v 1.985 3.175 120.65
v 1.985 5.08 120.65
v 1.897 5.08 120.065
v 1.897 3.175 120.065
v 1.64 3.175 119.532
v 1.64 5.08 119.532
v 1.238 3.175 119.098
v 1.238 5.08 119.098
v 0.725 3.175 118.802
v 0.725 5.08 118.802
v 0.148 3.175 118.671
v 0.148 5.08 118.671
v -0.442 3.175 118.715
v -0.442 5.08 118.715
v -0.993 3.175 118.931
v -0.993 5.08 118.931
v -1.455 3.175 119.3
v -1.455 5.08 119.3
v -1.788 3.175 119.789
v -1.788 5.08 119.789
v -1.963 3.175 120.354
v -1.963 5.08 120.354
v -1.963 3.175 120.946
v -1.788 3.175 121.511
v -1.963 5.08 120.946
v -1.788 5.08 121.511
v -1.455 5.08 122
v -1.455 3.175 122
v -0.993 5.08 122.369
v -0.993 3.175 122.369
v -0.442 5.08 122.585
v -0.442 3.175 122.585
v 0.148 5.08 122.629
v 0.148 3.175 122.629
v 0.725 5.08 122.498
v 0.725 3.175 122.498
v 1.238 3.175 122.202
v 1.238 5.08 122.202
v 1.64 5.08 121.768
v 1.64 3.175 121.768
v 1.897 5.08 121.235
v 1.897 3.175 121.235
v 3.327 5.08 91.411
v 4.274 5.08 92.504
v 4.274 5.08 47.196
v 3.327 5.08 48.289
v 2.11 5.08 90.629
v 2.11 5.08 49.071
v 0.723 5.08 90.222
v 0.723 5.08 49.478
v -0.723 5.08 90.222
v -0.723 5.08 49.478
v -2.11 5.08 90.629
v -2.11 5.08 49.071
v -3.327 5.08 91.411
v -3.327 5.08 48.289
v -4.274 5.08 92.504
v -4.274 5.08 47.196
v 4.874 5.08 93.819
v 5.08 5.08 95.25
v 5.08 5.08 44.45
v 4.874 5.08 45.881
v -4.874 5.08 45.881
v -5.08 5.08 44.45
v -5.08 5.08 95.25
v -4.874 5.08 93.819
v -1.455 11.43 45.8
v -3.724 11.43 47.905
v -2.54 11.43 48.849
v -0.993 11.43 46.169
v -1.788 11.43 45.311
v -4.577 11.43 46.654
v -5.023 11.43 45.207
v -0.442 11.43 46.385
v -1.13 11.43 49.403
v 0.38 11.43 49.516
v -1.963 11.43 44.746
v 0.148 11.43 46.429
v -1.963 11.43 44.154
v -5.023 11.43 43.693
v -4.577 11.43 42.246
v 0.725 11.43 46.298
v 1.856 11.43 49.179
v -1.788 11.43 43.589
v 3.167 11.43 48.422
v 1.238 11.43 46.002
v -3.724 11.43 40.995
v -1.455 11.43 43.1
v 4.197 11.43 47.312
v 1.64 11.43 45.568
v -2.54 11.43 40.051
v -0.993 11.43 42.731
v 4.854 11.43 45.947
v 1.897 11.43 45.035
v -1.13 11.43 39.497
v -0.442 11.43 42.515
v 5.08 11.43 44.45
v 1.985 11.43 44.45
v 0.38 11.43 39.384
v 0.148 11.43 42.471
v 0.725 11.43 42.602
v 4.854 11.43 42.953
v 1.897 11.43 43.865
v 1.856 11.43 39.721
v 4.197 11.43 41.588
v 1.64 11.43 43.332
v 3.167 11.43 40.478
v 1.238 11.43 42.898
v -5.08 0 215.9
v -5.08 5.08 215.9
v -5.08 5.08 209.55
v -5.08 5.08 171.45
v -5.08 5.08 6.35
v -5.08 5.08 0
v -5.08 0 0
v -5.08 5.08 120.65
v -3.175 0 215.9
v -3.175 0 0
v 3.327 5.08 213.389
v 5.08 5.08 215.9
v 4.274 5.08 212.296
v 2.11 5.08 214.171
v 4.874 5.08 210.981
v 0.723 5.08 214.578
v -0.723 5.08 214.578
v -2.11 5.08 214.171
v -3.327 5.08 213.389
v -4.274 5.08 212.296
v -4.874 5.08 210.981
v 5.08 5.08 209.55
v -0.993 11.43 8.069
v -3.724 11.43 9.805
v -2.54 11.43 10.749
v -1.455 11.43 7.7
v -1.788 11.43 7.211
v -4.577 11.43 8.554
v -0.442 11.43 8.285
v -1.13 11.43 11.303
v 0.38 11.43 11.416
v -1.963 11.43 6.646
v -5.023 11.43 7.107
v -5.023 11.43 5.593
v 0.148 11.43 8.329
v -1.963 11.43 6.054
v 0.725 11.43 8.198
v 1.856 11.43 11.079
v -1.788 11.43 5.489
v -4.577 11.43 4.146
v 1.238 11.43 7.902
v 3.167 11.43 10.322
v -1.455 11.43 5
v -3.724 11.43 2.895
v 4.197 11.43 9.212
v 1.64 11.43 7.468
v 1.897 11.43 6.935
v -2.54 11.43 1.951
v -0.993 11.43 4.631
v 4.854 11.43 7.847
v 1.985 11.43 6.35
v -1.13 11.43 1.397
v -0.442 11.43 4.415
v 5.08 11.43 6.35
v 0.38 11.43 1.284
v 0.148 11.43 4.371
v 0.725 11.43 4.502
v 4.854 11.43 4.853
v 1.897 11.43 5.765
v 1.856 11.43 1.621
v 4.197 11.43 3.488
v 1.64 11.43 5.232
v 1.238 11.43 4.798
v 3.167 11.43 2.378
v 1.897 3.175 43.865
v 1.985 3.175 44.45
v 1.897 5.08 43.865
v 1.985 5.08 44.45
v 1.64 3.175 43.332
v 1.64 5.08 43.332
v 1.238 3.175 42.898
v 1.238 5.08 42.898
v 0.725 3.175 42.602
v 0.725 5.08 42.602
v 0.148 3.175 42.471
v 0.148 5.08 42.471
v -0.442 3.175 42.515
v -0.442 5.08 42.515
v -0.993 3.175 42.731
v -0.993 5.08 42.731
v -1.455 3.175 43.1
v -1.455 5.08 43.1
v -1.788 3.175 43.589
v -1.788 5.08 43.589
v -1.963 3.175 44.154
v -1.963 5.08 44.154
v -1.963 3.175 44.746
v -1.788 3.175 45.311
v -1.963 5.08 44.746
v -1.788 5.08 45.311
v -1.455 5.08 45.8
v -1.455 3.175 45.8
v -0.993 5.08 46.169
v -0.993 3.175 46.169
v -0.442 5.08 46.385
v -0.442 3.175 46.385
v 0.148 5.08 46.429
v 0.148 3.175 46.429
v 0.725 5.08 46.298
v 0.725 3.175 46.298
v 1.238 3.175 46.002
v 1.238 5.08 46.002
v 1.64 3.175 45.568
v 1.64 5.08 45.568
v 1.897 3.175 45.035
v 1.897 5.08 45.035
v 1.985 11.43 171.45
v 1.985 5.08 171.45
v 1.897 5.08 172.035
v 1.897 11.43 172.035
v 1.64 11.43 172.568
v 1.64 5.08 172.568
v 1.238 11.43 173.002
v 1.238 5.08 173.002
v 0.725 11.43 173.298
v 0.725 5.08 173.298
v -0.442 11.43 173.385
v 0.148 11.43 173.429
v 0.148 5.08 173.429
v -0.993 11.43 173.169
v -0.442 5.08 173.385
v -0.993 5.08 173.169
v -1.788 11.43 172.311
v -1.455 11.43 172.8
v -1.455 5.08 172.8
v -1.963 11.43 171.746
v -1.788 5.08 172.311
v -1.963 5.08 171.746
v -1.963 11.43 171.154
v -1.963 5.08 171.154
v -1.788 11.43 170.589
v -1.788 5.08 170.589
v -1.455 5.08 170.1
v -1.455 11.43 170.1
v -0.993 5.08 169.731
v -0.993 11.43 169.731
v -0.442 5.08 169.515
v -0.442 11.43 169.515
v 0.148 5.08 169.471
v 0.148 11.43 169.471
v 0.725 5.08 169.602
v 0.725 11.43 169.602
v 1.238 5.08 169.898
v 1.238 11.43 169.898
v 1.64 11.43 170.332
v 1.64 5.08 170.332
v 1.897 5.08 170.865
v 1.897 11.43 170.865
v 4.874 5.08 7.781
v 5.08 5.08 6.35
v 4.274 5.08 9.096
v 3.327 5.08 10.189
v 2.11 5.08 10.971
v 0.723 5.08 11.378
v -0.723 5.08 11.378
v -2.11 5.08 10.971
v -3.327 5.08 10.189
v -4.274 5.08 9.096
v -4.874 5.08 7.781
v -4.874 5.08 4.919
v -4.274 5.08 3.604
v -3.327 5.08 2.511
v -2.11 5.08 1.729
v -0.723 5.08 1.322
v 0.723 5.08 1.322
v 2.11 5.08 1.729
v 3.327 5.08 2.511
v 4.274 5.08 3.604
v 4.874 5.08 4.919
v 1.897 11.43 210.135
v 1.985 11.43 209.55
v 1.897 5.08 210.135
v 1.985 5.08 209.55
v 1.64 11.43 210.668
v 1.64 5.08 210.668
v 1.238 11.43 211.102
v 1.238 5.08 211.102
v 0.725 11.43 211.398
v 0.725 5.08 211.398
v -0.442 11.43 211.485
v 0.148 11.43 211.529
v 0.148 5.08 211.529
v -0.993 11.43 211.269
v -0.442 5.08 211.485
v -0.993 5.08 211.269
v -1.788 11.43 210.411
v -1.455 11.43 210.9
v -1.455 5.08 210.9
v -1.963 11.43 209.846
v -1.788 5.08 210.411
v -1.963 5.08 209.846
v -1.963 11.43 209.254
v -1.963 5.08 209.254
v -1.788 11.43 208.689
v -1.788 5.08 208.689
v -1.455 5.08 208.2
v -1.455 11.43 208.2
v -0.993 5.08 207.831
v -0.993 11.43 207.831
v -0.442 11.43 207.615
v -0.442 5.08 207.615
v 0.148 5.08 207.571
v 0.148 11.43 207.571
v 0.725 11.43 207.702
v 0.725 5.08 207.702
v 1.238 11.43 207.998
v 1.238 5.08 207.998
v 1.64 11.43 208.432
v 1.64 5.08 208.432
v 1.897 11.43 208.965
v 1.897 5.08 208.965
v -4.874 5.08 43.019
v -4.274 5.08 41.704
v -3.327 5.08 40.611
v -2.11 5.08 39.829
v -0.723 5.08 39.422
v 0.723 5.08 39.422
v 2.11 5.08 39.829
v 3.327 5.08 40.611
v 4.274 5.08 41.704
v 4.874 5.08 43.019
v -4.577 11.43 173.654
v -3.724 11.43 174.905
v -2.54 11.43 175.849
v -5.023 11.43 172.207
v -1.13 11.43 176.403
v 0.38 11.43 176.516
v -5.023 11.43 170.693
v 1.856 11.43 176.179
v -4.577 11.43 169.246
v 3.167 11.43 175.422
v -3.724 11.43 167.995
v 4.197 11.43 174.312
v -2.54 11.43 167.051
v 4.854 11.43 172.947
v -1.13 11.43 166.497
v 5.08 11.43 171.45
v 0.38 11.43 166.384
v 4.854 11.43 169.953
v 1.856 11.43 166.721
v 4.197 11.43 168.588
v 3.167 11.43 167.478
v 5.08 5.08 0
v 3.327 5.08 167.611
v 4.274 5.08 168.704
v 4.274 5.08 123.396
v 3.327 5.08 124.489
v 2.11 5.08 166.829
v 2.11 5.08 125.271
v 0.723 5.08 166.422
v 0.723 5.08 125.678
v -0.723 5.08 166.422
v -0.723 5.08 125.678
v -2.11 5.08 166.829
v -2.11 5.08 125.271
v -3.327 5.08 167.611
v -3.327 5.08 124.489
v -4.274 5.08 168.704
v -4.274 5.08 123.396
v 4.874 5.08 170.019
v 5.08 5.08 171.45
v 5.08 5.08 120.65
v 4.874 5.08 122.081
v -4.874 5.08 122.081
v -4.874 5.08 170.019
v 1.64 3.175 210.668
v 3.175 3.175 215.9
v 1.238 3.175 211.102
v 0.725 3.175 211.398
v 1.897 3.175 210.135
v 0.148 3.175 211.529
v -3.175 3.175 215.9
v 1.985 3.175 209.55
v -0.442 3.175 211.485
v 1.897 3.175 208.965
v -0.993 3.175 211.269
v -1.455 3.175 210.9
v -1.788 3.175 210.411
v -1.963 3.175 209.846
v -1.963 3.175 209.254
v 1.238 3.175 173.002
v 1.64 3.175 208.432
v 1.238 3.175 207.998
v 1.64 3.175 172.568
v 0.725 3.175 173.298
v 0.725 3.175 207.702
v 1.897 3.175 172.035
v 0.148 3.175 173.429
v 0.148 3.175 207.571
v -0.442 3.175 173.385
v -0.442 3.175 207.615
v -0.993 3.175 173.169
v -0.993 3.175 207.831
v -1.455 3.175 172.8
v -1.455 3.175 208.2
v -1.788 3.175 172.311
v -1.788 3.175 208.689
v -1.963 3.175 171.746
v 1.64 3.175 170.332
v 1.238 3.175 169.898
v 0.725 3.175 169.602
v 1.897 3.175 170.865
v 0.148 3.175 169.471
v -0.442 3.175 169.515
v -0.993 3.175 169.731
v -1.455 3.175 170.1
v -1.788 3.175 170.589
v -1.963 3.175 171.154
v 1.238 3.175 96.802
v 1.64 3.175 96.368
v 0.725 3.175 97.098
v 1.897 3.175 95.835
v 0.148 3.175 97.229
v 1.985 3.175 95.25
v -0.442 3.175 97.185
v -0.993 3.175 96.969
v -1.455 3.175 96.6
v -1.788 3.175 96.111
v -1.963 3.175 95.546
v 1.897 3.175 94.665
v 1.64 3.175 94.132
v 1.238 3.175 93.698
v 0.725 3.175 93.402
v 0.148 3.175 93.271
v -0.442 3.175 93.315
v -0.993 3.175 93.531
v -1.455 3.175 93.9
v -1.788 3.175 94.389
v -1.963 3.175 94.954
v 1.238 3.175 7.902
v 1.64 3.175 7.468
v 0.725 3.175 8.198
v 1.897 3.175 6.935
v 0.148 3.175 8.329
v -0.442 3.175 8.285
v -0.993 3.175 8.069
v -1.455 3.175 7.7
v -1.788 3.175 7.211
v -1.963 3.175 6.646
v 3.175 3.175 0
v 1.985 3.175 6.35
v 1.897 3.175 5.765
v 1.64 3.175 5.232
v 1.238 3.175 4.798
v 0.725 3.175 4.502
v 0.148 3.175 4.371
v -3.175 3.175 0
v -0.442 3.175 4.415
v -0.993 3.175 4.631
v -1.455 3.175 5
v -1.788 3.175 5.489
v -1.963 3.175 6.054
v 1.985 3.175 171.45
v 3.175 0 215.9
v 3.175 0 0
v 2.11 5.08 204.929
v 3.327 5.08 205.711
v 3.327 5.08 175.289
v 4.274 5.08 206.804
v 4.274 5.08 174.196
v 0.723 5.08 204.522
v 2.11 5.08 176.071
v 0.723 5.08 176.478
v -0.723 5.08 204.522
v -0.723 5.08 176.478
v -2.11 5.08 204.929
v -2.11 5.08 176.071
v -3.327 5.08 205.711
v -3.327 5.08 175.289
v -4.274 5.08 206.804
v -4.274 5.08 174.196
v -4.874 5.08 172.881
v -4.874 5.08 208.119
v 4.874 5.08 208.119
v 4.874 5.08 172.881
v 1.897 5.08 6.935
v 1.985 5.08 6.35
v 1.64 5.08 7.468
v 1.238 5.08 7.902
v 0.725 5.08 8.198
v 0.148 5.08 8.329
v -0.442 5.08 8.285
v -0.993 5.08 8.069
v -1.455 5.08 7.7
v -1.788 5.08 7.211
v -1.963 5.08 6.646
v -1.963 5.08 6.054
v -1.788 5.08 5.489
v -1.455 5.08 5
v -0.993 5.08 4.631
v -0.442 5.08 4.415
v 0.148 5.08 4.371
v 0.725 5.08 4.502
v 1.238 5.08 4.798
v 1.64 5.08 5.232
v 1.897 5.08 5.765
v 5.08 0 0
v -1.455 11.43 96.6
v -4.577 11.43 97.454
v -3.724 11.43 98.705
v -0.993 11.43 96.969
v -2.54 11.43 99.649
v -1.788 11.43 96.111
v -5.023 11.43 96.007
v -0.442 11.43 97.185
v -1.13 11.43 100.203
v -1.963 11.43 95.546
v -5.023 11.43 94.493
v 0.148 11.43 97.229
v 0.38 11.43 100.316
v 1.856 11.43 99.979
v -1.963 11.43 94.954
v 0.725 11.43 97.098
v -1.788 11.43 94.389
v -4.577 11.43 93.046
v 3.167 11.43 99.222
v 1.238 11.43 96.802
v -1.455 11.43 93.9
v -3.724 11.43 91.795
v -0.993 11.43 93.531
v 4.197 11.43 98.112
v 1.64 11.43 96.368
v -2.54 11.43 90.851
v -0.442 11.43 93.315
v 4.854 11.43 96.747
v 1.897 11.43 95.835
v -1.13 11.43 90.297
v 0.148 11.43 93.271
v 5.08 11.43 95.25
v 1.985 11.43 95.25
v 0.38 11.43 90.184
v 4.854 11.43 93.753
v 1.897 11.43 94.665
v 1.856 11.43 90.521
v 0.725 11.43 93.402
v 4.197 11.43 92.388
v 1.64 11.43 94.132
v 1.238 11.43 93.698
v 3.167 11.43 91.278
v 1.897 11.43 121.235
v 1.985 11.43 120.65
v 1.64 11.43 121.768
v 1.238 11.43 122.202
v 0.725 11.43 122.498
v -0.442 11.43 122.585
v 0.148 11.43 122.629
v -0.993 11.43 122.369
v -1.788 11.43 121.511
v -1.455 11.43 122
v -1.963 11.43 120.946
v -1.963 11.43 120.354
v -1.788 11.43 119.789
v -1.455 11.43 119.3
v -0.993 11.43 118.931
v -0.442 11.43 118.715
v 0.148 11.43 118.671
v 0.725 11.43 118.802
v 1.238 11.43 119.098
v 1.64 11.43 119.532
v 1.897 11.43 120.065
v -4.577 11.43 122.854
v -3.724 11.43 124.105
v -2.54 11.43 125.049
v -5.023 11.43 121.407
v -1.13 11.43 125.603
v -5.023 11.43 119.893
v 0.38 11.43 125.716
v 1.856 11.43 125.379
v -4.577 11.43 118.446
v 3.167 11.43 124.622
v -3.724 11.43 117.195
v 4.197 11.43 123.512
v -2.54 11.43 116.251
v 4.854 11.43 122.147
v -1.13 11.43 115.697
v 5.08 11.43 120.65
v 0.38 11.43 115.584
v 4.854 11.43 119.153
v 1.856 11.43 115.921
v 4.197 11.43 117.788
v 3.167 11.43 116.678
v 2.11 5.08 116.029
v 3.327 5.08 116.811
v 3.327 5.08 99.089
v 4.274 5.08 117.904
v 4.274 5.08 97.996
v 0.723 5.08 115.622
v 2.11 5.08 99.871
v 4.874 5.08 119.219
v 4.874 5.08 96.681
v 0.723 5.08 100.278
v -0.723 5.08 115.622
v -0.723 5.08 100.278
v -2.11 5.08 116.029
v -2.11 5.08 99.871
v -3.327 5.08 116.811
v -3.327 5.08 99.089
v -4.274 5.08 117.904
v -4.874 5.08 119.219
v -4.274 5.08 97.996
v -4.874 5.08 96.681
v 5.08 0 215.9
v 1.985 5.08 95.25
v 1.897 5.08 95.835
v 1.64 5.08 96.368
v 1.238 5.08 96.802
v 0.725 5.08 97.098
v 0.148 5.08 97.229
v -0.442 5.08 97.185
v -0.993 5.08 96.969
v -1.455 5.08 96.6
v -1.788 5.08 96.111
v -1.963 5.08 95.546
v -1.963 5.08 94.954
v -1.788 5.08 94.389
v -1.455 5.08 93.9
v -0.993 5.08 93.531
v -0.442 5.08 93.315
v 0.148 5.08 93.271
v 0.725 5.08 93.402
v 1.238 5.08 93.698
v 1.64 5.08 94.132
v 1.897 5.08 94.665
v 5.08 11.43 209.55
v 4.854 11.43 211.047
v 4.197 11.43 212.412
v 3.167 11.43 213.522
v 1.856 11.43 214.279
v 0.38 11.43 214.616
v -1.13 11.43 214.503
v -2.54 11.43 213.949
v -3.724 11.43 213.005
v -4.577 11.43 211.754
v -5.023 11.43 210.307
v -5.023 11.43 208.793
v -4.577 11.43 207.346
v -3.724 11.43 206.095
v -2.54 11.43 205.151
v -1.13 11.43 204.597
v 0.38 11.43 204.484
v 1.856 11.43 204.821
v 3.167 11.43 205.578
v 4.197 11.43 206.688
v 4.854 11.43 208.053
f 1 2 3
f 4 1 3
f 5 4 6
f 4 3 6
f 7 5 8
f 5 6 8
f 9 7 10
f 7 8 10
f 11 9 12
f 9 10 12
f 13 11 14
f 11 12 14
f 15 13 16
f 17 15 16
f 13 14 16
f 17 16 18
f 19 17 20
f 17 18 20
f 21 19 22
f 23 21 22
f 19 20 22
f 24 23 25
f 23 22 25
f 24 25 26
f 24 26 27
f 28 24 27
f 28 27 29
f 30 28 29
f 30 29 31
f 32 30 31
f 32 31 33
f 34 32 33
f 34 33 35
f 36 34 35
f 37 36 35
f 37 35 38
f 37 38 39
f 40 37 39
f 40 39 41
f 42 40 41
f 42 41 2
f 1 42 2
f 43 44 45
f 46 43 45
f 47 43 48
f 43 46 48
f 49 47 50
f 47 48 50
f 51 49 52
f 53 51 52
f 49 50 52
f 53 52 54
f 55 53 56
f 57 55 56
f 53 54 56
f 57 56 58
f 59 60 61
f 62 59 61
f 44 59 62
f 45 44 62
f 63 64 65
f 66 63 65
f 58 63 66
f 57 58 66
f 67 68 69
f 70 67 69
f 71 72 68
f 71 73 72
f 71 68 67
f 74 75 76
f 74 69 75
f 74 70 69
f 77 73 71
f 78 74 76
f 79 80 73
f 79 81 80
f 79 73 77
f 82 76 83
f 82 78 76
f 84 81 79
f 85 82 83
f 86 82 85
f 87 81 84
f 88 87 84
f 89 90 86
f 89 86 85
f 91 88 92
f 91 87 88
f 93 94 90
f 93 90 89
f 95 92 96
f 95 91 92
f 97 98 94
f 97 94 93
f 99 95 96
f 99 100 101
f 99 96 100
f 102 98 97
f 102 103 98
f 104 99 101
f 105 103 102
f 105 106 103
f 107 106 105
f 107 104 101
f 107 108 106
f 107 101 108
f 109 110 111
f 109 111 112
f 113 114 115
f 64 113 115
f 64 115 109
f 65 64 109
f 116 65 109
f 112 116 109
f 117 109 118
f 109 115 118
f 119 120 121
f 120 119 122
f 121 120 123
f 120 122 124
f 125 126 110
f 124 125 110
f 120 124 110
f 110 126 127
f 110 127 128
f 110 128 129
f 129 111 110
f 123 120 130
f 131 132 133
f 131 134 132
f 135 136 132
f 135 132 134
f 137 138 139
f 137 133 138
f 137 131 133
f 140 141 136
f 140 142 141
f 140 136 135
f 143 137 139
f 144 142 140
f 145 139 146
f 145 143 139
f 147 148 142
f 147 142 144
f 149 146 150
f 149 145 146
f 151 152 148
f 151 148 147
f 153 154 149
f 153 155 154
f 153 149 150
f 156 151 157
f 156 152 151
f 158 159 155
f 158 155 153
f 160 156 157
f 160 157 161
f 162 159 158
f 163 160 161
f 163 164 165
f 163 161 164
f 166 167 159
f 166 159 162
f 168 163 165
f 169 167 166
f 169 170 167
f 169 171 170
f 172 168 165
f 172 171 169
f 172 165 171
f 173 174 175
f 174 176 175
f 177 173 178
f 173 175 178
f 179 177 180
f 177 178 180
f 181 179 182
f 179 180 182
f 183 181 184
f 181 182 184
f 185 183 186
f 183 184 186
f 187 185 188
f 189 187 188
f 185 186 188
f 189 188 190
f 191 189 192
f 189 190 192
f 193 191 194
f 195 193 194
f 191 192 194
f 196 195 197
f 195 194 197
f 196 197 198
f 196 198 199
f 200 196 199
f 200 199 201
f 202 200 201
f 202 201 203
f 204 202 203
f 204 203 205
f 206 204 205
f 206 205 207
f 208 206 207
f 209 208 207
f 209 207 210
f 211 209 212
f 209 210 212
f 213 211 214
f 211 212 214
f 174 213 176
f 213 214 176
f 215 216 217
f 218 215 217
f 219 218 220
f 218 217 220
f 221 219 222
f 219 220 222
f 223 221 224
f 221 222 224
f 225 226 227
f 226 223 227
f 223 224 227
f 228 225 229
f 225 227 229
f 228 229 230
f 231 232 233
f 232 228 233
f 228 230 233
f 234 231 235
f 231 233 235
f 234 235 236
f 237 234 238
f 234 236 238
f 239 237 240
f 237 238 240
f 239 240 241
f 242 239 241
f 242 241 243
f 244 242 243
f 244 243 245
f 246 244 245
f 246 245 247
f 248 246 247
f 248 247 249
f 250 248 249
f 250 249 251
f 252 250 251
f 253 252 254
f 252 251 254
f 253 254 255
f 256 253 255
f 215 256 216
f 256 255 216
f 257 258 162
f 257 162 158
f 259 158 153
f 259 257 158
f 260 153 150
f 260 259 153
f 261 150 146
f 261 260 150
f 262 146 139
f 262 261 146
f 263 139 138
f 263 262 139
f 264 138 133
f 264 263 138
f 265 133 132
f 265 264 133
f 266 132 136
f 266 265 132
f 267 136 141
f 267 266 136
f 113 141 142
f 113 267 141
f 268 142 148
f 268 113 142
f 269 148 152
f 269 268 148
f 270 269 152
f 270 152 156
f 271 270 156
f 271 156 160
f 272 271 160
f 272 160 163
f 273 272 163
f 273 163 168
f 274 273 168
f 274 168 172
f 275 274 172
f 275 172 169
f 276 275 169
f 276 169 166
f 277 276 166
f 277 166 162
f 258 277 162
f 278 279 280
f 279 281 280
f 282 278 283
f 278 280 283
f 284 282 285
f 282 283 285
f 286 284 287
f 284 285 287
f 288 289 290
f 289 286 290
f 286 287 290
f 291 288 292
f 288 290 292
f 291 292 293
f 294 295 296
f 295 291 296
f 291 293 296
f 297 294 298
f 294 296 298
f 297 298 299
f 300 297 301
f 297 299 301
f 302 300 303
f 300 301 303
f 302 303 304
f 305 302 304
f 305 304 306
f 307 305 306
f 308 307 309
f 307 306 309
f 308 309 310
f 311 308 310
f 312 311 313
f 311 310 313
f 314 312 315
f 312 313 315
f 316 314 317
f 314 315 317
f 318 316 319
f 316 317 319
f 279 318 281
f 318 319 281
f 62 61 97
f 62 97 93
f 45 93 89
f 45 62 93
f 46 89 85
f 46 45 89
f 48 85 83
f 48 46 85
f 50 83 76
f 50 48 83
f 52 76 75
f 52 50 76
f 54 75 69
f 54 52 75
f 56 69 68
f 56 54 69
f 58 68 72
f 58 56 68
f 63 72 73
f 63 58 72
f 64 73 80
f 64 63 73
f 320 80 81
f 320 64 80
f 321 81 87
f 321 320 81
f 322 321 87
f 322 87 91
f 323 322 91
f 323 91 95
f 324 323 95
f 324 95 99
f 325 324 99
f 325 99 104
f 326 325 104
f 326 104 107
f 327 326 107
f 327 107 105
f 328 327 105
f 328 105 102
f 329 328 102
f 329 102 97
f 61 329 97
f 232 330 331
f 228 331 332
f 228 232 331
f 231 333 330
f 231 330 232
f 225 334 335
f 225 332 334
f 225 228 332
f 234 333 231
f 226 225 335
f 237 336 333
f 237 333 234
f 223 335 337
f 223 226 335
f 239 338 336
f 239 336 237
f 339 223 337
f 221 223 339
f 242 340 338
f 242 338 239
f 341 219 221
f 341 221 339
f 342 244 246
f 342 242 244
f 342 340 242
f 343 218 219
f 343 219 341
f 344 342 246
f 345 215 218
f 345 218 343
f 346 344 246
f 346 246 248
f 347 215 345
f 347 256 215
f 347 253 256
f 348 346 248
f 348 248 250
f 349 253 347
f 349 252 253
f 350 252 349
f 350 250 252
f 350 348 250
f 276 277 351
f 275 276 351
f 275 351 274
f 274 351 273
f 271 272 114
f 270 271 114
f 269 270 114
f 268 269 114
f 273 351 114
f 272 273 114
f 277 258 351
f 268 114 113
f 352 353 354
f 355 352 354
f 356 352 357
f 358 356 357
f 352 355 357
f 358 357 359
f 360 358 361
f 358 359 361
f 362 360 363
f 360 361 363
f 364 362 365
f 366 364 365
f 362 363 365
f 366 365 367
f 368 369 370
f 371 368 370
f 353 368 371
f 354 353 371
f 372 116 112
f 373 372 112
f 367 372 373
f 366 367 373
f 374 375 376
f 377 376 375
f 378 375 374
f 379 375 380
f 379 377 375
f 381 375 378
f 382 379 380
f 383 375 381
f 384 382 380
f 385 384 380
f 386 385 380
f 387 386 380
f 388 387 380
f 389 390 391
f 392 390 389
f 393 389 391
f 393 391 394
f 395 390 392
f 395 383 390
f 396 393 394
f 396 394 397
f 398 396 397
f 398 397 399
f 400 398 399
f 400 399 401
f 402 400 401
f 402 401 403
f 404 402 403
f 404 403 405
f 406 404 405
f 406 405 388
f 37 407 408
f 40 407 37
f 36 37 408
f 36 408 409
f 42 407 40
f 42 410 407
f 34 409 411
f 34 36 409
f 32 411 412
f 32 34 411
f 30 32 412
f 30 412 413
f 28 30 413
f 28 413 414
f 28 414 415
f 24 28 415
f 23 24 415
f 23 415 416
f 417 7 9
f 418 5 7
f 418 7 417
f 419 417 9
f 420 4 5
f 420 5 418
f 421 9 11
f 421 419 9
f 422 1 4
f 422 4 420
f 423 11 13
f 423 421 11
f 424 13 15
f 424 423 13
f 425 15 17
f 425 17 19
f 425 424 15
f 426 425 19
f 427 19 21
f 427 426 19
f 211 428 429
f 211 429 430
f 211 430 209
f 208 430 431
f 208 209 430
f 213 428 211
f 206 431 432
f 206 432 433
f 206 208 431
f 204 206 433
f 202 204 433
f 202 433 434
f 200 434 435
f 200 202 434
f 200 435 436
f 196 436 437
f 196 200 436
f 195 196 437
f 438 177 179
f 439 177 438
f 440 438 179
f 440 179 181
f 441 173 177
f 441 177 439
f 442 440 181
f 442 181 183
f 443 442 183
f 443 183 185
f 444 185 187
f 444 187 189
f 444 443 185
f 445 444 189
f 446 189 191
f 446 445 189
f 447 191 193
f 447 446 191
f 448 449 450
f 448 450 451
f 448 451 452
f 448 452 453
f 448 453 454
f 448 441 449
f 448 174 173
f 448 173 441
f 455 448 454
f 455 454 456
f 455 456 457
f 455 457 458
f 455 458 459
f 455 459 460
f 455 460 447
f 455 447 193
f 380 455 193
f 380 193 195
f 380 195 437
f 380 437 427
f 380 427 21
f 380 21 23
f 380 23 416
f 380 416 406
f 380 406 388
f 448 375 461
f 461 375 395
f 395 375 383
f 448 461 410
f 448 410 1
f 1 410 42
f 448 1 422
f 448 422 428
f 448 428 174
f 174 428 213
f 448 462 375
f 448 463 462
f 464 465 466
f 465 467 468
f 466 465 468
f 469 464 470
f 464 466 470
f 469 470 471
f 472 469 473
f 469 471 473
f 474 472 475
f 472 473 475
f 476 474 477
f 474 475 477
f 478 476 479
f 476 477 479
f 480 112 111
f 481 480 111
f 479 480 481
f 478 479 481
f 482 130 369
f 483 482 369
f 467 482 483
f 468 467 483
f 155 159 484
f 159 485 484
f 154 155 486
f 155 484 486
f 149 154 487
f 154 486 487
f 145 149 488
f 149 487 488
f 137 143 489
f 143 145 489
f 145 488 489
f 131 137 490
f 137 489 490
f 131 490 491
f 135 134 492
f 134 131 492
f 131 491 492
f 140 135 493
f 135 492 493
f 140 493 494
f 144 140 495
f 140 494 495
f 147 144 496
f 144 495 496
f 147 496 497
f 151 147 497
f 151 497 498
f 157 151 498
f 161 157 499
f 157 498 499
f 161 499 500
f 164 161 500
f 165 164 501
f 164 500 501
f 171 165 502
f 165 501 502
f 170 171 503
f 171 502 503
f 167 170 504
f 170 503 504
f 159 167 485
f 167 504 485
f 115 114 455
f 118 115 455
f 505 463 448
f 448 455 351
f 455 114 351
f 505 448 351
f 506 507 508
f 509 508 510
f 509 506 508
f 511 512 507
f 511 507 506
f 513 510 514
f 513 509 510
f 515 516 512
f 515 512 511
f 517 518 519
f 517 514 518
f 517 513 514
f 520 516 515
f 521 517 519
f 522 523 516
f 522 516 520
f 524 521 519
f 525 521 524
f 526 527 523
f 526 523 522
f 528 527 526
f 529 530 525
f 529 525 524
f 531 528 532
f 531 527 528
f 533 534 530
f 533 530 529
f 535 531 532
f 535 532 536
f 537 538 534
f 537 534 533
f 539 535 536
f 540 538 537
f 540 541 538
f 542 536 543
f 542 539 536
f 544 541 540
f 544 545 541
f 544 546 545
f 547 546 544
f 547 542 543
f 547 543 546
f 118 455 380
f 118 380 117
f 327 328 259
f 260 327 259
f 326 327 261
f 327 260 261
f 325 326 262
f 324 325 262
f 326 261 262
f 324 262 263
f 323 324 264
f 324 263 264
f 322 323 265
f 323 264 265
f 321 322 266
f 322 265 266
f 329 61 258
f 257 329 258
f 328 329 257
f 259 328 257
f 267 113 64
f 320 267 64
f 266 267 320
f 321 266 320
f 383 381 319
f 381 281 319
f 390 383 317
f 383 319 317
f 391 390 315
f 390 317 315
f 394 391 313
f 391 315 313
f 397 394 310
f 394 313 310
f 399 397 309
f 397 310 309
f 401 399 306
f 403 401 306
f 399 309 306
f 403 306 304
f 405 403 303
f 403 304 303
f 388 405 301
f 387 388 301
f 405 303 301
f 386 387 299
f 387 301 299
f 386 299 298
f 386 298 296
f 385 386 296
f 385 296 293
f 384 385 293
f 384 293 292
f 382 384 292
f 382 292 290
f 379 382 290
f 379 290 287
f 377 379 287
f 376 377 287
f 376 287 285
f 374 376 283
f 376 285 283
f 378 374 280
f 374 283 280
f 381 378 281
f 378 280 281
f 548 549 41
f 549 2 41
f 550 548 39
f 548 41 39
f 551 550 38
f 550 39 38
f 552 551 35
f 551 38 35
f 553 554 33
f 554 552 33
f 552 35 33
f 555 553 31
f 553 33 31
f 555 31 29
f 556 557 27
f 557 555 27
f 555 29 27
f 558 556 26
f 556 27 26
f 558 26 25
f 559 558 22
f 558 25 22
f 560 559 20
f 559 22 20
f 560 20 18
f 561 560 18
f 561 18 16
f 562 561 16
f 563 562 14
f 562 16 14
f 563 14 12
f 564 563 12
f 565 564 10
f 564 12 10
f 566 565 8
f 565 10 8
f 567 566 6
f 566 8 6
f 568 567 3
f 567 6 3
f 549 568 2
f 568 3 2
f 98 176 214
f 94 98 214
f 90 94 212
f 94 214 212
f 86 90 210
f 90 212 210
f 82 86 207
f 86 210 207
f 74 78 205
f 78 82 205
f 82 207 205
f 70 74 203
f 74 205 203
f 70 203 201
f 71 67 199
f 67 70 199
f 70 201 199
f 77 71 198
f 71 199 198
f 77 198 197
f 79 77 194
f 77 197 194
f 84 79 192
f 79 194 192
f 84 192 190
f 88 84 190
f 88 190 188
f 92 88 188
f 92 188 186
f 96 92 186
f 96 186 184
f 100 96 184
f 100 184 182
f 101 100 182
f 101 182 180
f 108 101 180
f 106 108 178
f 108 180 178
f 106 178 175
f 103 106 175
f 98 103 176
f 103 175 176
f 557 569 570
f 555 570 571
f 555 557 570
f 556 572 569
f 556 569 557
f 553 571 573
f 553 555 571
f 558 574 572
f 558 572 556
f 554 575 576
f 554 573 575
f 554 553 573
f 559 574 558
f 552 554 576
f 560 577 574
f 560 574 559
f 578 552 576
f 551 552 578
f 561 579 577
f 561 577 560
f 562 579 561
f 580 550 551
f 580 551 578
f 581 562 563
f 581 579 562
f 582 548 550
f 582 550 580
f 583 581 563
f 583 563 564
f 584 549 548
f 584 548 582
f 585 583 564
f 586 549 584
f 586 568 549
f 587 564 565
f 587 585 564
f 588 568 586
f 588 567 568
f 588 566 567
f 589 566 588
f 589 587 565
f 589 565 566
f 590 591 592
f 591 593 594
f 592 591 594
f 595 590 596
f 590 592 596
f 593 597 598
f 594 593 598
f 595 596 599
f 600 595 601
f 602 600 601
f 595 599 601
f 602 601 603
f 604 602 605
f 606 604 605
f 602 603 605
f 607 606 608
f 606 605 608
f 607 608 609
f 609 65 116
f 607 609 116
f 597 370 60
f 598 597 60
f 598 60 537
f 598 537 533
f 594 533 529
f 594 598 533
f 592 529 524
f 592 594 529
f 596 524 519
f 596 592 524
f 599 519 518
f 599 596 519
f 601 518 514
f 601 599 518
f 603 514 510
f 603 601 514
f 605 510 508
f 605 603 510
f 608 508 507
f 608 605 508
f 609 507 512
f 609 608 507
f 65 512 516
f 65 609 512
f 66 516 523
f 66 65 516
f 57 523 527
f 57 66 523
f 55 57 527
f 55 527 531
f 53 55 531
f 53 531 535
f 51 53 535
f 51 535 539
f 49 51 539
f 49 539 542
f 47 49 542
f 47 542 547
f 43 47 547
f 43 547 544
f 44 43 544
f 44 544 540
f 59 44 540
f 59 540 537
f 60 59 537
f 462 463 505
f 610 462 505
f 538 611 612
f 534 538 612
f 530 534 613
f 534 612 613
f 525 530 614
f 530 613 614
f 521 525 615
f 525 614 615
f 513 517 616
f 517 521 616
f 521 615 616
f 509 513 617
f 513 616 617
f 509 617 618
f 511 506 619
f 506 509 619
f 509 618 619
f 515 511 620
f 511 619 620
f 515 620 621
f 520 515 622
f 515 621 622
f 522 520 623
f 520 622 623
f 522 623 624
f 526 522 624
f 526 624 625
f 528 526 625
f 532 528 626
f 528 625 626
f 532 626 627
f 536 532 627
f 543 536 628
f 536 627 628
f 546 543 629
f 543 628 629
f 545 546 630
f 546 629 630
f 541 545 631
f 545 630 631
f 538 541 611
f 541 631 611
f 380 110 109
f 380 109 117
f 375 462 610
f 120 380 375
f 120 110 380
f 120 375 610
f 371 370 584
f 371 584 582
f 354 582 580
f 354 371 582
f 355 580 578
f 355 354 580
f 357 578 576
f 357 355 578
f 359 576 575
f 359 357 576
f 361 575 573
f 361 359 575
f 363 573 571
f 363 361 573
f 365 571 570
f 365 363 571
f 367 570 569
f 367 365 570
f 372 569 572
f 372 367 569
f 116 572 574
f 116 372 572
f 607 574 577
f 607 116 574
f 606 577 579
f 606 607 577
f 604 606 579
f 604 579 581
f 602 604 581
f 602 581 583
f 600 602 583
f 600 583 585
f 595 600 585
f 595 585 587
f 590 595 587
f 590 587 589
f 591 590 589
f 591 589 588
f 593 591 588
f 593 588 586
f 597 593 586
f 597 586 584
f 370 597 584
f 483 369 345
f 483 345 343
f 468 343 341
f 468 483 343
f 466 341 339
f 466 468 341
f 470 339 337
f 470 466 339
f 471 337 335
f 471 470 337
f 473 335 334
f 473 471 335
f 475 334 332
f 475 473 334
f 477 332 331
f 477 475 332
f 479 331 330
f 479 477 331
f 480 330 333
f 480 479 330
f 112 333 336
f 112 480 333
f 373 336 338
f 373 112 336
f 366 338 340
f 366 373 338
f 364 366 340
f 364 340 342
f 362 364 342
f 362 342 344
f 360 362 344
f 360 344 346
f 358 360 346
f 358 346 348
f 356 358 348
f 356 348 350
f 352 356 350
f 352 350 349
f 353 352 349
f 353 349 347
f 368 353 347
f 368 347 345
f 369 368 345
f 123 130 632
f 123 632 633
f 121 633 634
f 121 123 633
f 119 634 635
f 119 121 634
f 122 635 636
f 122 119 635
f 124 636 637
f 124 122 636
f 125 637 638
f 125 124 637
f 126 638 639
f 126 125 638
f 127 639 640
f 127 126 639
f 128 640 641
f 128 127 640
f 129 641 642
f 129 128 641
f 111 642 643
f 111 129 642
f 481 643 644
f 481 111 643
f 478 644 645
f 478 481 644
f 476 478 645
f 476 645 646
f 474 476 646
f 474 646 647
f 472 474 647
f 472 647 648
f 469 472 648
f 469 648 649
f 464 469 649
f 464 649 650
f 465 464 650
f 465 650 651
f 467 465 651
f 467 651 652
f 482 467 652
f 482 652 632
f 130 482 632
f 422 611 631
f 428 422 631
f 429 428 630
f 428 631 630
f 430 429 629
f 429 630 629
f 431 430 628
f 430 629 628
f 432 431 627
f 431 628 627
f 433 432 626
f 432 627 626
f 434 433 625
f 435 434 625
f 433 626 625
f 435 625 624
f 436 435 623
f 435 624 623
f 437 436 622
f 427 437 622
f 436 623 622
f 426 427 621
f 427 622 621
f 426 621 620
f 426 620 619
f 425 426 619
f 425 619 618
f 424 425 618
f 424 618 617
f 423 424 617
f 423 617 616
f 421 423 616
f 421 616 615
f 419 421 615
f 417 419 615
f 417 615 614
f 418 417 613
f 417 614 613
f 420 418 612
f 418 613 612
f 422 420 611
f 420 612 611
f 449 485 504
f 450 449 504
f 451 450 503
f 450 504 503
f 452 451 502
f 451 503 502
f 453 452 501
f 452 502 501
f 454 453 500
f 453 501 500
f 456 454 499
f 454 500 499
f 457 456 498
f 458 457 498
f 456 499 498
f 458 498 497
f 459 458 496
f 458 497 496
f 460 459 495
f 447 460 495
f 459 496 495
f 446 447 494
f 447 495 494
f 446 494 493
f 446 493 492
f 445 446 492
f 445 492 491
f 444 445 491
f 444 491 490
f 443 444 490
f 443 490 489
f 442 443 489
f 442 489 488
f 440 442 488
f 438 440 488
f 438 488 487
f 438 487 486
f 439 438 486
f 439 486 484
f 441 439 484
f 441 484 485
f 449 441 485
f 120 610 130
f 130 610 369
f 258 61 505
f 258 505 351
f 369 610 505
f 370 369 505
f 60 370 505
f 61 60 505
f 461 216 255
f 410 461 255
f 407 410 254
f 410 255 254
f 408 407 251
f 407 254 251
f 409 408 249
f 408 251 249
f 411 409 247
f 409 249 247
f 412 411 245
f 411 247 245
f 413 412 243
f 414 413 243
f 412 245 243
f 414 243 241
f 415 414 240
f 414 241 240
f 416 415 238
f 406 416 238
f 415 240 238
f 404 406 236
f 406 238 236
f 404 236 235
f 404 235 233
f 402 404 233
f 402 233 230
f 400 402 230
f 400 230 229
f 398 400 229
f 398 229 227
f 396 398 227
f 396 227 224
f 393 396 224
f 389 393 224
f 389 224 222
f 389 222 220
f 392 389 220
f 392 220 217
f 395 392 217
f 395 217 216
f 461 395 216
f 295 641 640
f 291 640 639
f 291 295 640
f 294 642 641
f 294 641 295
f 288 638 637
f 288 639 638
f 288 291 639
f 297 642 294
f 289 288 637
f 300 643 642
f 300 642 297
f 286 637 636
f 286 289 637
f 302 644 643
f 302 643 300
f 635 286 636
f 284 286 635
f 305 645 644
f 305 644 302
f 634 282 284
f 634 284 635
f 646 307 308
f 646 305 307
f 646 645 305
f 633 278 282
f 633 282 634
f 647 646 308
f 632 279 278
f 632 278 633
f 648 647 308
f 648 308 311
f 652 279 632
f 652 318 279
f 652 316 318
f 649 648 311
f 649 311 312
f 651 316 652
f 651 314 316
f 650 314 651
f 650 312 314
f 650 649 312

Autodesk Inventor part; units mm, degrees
ref_plane "YZ Plane" through (0, 0, 0) normal (1, 0, 0) x (0, 1, 0)
ref_plane "XZ Plane" through (0, 0, 0) normal (0, 1, 0) x (-1, 0, 0)
ref_plane "XY Plane" through (0, 0, 0) normal (0, 0, 1) x (1, 0, 0)
sketch "Sketch1" plane through (0, 0, 0) normal (0, 0, 1) x (1, 0, 0)
  line L0 (3.175, 0) -> (3.175, 3.175)
  line L1 (3.175, 3.175) -> (-3.175, 3.175)
  line L2 (-3.175, 3.175) -> (-3.175, 0)
  line L3 (5.08, 0) -> (5.08, 5.08)
  line L4 (5.08, 5.08) -> (-5.08, 5.08)
  line L5 (-5.08, 5.08) -> (-5.08, 0)
  line L6 (-5.08, 0) -> (-3.175, 0)
  line L7 (3.175, 0) -> (5.08, 0)
  point P0 (0, 0)
  dimension "d0" = 6.35
  dimension "d1" = 3.175
  dimension "d2" = 10.16
  dimension "d3" = 5.08
extrude "Extrusion1" add sketch "Sketch1" along normal blind 215.9
sketch "Sketch2" plane through (-5.08, 5.08, 0) normal (0, 1, 0) x (1, 0, 0)
  circle A0 centre (5.08, -6.35) radius 1.985
  circle A1 centre (5.08, -209.55) radius 1.985
  circle A2 centre (5.08, -44.45) radius 1.985
  circle A3 centre (5.08, -171.45) radius 1.985
  circle A4 centre (5.08, -95.25) radius 1.985
  circle A5 centre (5.08, -120.65) radius 1.985
  point P0 (5.08, 0)
  dimension "d6" = 3.97
  dimension "d7" = 3.97
  dimension "d8" = 3.97
  dimension "d9" = 3.97
  dimension "d10" = 3.97
  dimension "d11" = 3.97
extrude "Extrusion2" cut sketch "Sketch2" against normal blind 215.9
sketch "Sketch3" plane through (5.08, 0, 0) normal (1, 0, 0) x (0, 0, -1)
  point P0 (0, 0)
sketch "Sketch4" plane through (-5.08, 5.08, 0) normal (0, 1, 0) x (1, 0, 0)
  circle A0 centre (5.08, -6.35) radius 1.985 projected
  circle A1 centre (5.08, -44.45) radius 1.985 projected
  circle A2 centre (5.08, -95.25) radius 1.985 projected
  circle A3 centre (5.08, -120.65) radius 1.985 projected
  circle A4 centre (5.08, -171.45) radius 1.985 projected
  circle A5 centre (5.08, -6.35) radius 5.08
  circle A6 centre (5.08, -44.45) radius 5.08
  line L0 (0, 0) -> (0, -215.9) projected
  circle A7 centre (5.08, -95.25) radius 5.08
  circle A8 centre (5.08, -120.65) radius 5.08
  circle A9 centre (5.08, -171.45) radius 5.08
  circle A10 centre (5.08, -209.55) radius 1.985 projected
  circle A11 centre (5.08, -209.55) radius 5.08
  point P0 (5.08, 0)
extrude "Extrusion3" add sketch "Sketch4" along normal blind 6.35
properties part number "chassis_brace_jig"
